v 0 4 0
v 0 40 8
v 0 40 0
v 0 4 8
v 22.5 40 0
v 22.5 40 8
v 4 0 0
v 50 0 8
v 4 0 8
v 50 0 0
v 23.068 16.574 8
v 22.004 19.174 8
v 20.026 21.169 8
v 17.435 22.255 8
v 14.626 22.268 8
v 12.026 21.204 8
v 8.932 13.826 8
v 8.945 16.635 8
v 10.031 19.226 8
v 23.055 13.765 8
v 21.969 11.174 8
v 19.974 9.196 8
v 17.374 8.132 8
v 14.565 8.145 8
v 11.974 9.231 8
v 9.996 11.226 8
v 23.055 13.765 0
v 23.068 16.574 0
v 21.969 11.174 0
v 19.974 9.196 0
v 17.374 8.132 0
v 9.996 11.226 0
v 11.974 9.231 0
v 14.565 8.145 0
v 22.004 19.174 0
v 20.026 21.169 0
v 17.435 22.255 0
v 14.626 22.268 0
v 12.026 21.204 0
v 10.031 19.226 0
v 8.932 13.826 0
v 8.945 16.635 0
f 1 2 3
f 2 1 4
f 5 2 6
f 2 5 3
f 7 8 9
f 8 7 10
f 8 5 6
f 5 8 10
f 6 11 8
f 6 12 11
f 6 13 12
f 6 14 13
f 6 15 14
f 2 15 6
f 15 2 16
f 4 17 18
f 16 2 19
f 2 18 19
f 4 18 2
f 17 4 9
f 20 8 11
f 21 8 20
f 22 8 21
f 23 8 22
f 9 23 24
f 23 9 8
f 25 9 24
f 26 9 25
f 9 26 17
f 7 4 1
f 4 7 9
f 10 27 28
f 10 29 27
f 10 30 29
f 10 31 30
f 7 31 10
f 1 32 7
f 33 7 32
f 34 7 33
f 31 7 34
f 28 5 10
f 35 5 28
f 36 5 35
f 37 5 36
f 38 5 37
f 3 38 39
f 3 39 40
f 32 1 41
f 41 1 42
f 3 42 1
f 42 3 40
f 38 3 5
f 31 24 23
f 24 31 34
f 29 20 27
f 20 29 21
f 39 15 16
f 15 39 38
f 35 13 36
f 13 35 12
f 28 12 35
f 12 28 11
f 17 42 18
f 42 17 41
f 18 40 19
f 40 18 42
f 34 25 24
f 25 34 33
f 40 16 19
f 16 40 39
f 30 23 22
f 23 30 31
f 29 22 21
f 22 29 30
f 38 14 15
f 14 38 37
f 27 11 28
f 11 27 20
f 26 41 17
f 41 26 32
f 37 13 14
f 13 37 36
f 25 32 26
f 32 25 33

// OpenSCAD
$fn = 32;

// ----------------------------------------------------------------------
// Bracket plate: gusset 50 x 40
// ----------------------------------------------------------------------

// --- parameters (mm) ---
hole_r = 4;               // bolt hole radius
plate_t = 8;              // plate thickness, Z (extrusion height)
gus_a = 50;               // base length
gus_b = 40;               // height
top_x = 22.5;             // top edge X of the angled cut
light_r = 7.2;            // lightening hole radius

light_d = 2 * light_r;

profile = [[4, 0], [25, 0], [50, 0], [22.5, 40], [0, 40], [0, 4]];  // primary outline, 6 points, counter clockwise
void_1 = [[23.068, 16.574], [22.004, 19.174], [20.026, 21.169], [17.435, 22.255], [14.626, 22.268], [12.026, 21.204], [10.031, 19.226], [8.945, 16.635], [8.932, 13.826], [9.996, 11.226], [11.974, 9.231], [14.565, 8.145], [17.374, 8.132], [19.974, 9.196], [21.969, 11.174], [23.055, 13.765]];  // lightening hole, 16 points

// --- the one profile operation ---
difference() {
  linear_extrude(height = plate_t) polygon(points = profile);
  translate([0, 0, -1])
    linear_extrude(height = plate_t + 2) polygon(points = void_1);
}
